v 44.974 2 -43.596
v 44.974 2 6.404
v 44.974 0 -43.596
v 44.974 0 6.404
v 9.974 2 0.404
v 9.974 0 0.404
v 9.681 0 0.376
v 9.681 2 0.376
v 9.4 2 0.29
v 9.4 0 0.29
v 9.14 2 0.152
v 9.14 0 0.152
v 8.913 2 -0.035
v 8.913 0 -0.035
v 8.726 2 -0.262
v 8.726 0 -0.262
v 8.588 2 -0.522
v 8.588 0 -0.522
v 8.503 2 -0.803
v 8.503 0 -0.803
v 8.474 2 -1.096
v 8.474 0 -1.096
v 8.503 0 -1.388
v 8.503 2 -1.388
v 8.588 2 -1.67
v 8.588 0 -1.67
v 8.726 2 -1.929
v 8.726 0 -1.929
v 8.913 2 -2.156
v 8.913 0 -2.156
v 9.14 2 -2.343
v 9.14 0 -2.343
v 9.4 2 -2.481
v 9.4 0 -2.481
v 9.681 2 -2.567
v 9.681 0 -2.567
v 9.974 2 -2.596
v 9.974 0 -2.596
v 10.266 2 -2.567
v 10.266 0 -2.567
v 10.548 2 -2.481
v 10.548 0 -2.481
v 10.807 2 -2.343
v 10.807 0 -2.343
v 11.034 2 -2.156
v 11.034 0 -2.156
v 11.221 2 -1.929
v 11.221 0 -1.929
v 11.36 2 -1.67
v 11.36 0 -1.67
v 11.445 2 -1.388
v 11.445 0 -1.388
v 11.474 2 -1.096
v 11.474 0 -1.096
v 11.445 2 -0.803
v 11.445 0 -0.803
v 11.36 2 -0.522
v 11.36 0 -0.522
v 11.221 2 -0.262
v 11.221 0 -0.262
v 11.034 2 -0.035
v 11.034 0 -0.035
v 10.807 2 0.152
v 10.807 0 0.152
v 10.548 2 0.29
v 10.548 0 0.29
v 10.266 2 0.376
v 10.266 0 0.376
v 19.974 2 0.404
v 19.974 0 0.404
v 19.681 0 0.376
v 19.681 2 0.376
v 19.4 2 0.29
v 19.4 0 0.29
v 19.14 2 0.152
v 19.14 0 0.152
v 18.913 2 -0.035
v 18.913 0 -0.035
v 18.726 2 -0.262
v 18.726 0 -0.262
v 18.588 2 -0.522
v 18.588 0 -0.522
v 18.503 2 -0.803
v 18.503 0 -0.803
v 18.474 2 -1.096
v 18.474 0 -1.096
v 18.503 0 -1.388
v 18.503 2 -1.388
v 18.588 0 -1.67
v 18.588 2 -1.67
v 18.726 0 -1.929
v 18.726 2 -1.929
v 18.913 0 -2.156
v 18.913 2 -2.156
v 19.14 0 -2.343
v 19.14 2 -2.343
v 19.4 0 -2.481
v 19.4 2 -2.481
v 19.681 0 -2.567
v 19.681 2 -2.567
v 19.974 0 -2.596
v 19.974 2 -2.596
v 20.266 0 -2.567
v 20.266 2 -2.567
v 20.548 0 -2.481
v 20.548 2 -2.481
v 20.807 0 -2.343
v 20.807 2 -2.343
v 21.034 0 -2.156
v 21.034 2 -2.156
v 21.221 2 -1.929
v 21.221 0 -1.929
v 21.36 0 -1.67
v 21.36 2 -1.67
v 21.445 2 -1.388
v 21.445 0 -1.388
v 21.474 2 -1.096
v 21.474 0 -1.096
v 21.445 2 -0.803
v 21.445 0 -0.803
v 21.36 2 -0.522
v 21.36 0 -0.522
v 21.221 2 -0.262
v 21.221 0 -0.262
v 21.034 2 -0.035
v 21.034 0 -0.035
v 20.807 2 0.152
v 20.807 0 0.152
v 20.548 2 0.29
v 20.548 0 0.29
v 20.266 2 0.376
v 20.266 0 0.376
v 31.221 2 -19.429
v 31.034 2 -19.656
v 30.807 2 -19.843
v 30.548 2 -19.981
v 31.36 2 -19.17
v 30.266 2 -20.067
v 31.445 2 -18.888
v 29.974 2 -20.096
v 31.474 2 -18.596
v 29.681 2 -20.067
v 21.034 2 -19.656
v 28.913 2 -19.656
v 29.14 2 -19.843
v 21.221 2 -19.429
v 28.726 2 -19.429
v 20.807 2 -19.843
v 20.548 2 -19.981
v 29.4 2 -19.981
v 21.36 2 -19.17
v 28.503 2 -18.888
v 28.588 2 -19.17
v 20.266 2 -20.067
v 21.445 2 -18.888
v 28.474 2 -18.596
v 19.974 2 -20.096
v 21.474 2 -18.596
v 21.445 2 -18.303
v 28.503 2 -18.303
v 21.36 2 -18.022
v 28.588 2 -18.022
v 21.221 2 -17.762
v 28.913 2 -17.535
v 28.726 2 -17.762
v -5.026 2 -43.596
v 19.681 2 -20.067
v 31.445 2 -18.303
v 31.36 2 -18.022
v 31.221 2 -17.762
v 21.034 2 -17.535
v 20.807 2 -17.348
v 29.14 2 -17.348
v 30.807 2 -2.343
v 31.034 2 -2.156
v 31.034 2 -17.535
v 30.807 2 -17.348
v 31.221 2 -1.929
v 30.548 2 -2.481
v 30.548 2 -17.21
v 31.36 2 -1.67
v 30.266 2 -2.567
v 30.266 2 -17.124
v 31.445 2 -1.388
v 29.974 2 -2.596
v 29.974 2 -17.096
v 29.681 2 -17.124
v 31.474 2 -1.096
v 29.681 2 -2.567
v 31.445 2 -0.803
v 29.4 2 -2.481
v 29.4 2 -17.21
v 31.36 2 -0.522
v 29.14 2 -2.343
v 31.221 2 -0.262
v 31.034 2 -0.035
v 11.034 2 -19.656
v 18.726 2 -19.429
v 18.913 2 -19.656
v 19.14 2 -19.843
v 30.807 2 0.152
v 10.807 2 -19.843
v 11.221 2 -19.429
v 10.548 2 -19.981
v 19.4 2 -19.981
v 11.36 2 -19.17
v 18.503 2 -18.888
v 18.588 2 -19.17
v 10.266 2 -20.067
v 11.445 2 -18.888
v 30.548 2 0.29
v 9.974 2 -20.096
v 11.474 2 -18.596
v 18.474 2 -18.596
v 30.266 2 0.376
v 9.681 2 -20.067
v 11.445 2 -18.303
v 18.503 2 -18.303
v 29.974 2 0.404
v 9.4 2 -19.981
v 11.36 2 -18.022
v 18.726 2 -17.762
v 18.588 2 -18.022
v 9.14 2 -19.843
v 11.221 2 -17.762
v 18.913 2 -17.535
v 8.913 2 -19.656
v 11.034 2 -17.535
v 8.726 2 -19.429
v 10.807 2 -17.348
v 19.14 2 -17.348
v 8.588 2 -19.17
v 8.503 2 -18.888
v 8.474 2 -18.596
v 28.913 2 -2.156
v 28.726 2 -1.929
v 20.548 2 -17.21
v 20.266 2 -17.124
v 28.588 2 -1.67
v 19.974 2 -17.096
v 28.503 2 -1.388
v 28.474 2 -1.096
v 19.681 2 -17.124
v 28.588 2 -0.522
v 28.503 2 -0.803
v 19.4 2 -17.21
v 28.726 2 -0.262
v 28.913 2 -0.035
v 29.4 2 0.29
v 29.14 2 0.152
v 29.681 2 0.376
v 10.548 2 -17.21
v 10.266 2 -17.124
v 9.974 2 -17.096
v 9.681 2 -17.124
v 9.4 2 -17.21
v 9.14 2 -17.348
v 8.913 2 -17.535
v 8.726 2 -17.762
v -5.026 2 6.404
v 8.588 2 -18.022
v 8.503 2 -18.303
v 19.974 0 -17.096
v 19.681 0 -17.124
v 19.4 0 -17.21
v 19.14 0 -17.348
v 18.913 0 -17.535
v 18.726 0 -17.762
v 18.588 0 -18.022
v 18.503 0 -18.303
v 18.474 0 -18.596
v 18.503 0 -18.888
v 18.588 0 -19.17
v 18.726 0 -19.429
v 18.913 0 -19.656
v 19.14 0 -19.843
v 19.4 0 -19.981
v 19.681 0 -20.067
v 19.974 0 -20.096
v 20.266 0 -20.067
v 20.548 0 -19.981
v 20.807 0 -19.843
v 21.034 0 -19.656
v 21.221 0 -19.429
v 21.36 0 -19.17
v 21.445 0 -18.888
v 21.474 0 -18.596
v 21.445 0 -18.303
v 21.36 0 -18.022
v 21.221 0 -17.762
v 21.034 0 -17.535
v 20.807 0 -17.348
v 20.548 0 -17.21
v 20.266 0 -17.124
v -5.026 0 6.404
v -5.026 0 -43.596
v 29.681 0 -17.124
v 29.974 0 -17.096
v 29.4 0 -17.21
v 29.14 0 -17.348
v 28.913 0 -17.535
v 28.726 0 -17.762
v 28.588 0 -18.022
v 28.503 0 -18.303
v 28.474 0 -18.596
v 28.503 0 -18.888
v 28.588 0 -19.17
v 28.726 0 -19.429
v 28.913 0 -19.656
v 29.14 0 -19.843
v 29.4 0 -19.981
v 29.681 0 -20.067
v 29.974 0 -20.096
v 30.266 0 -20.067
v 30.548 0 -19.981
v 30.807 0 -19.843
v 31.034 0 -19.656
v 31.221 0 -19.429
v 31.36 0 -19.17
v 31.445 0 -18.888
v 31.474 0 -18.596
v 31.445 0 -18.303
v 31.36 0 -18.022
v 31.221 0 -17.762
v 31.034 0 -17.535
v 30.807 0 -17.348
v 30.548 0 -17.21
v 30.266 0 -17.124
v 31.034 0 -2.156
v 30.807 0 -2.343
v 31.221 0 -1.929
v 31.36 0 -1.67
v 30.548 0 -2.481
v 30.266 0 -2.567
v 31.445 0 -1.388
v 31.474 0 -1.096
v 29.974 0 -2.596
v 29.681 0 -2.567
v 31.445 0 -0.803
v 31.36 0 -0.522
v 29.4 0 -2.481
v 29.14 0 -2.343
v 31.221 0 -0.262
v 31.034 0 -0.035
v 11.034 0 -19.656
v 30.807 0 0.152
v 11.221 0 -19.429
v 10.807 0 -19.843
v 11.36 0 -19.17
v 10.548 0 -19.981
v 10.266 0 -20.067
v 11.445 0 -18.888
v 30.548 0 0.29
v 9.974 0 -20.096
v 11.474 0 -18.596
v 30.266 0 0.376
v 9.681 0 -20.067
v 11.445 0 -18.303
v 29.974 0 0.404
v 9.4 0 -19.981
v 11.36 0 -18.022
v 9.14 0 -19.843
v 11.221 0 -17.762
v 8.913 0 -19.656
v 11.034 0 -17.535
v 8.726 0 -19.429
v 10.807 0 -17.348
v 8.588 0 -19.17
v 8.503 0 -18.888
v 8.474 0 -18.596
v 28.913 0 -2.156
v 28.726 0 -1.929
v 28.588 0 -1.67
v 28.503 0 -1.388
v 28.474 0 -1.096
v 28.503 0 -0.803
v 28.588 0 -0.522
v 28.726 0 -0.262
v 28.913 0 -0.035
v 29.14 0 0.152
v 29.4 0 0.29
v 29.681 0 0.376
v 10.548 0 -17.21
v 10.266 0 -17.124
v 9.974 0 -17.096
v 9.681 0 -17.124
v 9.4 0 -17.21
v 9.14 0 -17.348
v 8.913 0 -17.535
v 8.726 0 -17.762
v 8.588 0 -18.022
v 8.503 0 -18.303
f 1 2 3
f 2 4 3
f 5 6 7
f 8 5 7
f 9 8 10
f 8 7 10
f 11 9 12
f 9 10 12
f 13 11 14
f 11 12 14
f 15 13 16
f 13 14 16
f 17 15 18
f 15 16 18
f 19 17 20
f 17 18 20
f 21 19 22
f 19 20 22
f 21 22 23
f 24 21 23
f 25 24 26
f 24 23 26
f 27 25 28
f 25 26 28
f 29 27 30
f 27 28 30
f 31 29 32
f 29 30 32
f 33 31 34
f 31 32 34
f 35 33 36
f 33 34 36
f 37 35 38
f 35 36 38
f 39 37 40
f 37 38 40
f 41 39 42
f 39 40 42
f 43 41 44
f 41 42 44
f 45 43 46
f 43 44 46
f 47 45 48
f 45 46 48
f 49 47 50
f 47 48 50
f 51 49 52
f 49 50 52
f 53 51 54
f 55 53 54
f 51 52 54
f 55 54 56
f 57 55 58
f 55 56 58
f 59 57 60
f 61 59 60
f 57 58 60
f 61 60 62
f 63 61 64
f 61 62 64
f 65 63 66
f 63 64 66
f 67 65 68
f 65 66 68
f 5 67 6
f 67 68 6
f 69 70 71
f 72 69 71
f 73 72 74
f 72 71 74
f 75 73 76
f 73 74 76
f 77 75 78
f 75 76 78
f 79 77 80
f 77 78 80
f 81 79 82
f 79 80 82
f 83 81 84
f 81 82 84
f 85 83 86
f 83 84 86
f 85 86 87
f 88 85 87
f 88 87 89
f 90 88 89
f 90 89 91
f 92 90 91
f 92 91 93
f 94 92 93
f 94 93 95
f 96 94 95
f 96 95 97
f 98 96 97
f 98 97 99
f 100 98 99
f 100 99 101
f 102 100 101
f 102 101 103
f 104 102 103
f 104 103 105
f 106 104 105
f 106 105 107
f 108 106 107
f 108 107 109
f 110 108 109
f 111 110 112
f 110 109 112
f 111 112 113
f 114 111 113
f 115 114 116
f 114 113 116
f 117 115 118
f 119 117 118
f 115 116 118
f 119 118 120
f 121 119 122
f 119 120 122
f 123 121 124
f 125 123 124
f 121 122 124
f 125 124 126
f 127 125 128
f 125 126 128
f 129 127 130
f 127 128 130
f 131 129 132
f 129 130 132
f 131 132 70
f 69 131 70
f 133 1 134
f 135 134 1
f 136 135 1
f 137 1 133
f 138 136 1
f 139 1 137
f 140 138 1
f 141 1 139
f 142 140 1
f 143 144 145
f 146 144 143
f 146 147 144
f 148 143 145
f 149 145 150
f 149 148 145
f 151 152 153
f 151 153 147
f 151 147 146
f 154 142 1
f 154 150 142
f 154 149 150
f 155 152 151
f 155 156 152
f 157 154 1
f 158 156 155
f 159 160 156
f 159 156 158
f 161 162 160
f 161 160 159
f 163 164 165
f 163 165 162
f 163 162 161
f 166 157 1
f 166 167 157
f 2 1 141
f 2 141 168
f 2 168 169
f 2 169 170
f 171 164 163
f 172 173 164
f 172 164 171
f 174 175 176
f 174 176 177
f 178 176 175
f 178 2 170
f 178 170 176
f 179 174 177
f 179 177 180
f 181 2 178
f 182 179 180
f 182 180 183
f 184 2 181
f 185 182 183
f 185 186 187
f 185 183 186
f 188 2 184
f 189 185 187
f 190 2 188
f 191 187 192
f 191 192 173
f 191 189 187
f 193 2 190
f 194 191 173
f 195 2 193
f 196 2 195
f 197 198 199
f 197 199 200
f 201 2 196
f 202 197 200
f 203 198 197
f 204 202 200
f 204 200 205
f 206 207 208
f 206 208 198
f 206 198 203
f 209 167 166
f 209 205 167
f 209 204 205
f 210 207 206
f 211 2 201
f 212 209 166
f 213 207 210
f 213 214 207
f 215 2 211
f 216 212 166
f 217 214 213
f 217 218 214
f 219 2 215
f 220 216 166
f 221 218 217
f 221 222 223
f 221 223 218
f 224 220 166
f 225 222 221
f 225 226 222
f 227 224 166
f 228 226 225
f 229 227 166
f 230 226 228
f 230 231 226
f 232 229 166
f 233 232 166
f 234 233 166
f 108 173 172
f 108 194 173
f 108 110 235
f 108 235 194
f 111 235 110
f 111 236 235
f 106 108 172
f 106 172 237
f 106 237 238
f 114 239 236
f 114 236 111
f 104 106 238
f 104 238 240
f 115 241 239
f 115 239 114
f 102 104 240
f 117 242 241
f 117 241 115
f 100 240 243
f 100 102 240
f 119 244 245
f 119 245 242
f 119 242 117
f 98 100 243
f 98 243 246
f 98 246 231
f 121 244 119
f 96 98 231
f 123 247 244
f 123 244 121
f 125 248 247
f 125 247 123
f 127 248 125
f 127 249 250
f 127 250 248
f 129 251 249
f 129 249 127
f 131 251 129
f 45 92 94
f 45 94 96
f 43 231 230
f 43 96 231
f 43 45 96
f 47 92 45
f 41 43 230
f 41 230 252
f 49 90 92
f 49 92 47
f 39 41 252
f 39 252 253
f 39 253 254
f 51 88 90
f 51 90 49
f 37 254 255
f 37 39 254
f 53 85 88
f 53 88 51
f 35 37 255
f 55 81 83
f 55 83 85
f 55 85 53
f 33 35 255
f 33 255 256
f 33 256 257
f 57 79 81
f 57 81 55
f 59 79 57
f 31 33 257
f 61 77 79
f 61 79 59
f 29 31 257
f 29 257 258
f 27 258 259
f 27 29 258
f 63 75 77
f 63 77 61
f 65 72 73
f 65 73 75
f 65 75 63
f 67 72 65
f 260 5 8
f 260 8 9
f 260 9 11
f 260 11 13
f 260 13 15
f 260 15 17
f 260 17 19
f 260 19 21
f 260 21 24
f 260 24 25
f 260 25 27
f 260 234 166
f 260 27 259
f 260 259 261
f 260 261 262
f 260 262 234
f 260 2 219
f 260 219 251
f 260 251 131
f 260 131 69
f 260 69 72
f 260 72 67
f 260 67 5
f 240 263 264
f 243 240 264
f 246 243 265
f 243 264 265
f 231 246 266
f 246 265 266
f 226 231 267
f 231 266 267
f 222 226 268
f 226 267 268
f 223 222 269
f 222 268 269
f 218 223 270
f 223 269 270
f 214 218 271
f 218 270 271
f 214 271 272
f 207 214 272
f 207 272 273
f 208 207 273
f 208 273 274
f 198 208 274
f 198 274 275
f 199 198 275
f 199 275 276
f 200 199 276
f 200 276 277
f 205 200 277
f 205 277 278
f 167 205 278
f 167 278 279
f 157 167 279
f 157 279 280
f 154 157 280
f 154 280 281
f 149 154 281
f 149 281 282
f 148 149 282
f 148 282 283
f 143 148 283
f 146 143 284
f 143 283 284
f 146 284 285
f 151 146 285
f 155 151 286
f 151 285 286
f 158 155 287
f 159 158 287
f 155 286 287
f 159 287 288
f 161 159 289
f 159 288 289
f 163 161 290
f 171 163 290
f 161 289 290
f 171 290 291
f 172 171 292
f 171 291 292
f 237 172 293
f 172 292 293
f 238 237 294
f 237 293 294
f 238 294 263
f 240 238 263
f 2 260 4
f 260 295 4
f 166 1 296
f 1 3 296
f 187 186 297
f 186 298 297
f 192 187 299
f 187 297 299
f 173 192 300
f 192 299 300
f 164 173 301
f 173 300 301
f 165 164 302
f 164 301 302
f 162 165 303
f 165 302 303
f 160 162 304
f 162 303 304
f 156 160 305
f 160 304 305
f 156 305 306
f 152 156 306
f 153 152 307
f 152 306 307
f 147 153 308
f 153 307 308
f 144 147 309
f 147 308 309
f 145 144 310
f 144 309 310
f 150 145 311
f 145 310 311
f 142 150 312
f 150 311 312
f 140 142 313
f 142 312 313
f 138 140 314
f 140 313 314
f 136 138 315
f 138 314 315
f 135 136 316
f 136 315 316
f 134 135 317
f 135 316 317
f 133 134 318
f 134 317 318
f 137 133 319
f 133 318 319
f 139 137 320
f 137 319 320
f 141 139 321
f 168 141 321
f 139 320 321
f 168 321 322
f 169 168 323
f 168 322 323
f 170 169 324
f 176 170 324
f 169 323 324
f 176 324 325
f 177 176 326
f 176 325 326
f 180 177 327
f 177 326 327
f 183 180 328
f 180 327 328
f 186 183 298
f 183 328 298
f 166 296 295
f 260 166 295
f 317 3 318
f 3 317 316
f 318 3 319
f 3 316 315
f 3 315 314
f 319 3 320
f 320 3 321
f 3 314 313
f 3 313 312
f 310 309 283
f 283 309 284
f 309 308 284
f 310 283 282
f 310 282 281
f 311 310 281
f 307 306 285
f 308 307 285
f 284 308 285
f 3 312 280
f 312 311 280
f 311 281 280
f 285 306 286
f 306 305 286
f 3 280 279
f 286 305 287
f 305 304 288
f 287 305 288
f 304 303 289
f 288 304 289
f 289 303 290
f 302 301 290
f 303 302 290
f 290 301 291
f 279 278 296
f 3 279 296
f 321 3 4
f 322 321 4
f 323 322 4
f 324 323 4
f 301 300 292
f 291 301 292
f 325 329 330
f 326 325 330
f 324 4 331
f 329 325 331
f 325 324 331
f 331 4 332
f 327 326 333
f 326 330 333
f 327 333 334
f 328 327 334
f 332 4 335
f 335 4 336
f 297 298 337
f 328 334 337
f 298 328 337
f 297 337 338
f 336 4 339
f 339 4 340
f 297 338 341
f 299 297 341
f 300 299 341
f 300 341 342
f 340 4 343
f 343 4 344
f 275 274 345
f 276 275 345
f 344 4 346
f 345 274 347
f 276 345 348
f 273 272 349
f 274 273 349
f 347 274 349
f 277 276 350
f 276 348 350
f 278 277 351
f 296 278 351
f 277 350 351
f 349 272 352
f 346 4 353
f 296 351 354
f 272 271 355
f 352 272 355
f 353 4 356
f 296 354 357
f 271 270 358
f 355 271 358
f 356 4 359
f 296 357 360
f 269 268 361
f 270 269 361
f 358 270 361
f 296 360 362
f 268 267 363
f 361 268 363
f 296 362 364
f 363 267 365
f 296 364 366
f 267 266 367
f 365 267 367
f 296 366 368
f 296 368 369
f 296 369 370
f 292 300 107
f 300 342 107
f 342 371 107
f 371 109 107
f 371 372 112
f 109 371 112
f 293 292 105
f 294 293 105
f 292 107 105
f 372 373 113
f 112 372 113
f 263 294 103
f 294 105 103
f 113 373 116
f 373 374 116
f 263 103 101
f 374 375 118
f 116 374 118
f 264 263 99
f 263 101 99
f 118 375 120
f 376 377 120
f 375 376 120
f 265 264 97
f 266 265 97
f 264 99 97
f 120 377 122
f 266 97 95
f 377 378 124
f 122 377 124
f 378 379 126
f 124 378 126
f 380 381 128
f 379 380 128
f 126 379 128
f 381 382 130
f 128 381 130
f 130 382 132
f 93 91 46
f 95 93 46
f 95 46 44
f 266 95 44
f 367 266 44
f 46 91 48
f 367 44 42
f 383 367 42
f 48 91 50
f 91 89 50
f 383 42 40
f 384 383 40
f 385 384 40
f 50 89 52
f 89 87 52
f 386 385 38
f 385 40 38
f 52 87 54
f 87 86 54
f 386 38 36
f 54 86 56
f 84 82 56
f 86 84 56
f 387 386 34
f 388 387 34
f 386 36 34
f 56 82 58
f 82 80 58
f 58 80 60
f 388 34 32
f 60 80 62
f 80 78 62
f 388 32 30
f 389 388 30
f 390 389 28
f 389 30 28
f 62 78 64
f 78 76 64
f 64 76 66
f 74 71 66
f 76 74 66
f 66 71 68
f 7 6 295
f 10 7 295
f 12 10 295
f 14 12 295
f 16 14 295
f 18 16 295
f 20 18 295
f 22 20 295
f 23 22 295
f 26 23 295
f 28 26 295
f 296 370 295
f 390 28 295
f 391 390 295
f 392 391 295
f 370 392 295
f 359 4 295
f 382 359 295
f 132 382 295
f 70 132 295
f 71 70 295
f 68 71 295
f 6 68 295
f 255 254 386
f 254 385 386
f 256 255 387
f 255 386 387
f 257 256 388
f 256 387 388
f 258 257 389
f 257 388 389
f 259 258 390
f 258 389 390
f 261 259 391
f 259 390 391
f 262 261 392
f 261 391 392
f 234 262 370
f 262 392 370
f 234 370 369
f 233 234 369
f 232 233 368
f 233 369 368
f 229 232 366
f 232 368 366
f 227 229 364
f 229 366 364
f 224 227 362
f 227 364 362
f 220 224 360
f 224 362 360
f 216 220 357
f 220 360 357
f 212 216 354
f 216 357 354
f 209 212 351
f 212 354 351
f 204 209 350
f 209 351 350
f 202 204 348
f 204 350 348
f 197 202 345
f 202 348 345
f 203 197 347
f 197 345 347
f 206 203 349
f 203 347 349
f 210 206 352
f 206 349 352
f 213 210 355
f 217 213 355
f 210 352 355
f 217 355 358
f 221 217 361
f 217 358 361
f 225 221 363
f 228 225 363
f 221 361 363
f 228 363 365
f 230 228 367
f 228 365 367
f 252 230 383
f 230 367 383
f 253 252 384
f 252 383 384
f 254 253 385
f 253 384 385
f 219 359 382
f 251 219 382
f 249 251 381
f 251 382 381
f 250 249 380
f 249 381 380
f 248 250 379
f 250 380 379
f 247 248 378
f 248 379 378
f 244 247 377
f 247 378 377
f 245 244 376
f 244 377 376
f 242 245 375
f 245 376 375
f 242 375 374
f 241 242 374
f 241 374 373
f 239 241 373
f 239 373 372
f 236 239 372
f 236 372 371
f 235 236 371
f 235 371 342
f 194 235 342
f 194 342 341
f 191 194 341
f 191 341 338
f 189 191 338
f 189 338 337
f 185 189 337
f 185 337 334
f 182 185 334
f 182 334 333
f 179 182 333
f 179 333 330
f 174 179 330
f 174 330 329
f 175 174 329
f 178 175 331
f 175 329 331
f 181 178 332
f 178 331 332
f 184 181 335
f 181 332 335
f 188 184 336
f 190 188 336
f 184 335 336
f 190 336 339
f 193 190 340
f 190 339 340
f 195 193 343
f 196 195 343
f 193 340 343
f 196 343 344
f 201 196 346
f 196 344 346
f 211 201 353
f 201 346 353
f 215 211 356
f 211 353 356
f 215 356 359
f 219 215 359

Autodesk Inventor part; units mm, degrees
ref_plane "YZ Plane" through (0, 0, 0) normal (1, 0, 0) x (0, 1, 0)
ref_plane "XZ Plane" through (0, 0, 0) normal (0, 1, 0) x (-1, 0, 0)
ref_plane "XY Plane" through (0, 0, 0) normal (0, 0, 1) x (1, 0, 0)
sketch "スケッチ1" plane through (0, 0, 0) normal (0, 1, 0) x (-1, 0, 0)
  line L0 (5.0263, 6.4044) -> (-44.9737, 6.4044)
  line L1 (-44.9737, 6.4044) -> (-44.9737, -43.5956)
  line L2 (-44.9737, -43.5956) -> (5.0263, -43.5956)
  line L3 (5.0263, -43.5956) -> (5.0263, 6.4044)
  point P0 (0, 0)
  dimension "d0" = 50
  dimension "d1" = 50
extrude "押し出し1" add sketch "スケッチ1" along normal blind 2
sketch "スケッチ2" plane through (0, 2, 0) normal (0, 1, 0) x (1, 0, 0)
  circle A0 centre (19.9737, 1.0956) radius 1.5
  line L0 (-5.0263, -6.4044) -> (44.9737, -6.4044) projected
  line L1 (-5.0263, 43.5956) -> (-5.0263, -6.4044) projected
  circle A1 centre (9.9737, 1.0956) radius 1.5
  circle A2 centre (29.9737, 1.0956) radius 1.5
  circle A3 centre (9.9737, 18.5956) radius 1.5
  circle A4 centre (19.9737, 18.5956) radius 1.5
  circle A5 centre (29.9737, 18.5956) radius 1.5
  point P0 (0, 0)
  dimension "d4" = 3
  dimension "d5" = 7.5
  dimension "d6" = 25
  dimension "d7" = 3
  dimension "d8" = 3
  dimension "d9" = 10
  dimension "d10" = 10
  dimension "d11" = 3
  dimension "d12" = 17.5
  dimension "d13" = 3
  dimension "d14" = 3
  dimension "d15" = 10
  dimension "d16" = 10
  dimension "d17" = 17.5
hole "穴1" at (9.9737, 2, -1.0956) at (19.9737, 2, -1.0956) at (29.9737, 2, -1.0956) at (9.9737, 2, -18.5956) at (19.9737, 2, -18.5956) at (29.9737, 2, -18.5956) direction (0, -1, 0) diameter 3 depth 2
equation "\"BendRadius\" = Thickness"
equation "\"BendReliefWidth\" = Thickness"
equation "\"BendReliefDepth\" = 0.5 * Thickness"
equation "\"CornerReliefSize\" = 4 * Thickness"
equation "\"MinimumRemnant\" = 2 * Thickness"
equation "\"TransitionRadius\" = BendRadius"
equation "\"JacobiRadiusSize\" = BendRadius"
equation "\"GapSize\" = Thickness"
equation "\"Thickness\" = 0.5"
properties part number "nhk20" material "アルミニウム 6061"
